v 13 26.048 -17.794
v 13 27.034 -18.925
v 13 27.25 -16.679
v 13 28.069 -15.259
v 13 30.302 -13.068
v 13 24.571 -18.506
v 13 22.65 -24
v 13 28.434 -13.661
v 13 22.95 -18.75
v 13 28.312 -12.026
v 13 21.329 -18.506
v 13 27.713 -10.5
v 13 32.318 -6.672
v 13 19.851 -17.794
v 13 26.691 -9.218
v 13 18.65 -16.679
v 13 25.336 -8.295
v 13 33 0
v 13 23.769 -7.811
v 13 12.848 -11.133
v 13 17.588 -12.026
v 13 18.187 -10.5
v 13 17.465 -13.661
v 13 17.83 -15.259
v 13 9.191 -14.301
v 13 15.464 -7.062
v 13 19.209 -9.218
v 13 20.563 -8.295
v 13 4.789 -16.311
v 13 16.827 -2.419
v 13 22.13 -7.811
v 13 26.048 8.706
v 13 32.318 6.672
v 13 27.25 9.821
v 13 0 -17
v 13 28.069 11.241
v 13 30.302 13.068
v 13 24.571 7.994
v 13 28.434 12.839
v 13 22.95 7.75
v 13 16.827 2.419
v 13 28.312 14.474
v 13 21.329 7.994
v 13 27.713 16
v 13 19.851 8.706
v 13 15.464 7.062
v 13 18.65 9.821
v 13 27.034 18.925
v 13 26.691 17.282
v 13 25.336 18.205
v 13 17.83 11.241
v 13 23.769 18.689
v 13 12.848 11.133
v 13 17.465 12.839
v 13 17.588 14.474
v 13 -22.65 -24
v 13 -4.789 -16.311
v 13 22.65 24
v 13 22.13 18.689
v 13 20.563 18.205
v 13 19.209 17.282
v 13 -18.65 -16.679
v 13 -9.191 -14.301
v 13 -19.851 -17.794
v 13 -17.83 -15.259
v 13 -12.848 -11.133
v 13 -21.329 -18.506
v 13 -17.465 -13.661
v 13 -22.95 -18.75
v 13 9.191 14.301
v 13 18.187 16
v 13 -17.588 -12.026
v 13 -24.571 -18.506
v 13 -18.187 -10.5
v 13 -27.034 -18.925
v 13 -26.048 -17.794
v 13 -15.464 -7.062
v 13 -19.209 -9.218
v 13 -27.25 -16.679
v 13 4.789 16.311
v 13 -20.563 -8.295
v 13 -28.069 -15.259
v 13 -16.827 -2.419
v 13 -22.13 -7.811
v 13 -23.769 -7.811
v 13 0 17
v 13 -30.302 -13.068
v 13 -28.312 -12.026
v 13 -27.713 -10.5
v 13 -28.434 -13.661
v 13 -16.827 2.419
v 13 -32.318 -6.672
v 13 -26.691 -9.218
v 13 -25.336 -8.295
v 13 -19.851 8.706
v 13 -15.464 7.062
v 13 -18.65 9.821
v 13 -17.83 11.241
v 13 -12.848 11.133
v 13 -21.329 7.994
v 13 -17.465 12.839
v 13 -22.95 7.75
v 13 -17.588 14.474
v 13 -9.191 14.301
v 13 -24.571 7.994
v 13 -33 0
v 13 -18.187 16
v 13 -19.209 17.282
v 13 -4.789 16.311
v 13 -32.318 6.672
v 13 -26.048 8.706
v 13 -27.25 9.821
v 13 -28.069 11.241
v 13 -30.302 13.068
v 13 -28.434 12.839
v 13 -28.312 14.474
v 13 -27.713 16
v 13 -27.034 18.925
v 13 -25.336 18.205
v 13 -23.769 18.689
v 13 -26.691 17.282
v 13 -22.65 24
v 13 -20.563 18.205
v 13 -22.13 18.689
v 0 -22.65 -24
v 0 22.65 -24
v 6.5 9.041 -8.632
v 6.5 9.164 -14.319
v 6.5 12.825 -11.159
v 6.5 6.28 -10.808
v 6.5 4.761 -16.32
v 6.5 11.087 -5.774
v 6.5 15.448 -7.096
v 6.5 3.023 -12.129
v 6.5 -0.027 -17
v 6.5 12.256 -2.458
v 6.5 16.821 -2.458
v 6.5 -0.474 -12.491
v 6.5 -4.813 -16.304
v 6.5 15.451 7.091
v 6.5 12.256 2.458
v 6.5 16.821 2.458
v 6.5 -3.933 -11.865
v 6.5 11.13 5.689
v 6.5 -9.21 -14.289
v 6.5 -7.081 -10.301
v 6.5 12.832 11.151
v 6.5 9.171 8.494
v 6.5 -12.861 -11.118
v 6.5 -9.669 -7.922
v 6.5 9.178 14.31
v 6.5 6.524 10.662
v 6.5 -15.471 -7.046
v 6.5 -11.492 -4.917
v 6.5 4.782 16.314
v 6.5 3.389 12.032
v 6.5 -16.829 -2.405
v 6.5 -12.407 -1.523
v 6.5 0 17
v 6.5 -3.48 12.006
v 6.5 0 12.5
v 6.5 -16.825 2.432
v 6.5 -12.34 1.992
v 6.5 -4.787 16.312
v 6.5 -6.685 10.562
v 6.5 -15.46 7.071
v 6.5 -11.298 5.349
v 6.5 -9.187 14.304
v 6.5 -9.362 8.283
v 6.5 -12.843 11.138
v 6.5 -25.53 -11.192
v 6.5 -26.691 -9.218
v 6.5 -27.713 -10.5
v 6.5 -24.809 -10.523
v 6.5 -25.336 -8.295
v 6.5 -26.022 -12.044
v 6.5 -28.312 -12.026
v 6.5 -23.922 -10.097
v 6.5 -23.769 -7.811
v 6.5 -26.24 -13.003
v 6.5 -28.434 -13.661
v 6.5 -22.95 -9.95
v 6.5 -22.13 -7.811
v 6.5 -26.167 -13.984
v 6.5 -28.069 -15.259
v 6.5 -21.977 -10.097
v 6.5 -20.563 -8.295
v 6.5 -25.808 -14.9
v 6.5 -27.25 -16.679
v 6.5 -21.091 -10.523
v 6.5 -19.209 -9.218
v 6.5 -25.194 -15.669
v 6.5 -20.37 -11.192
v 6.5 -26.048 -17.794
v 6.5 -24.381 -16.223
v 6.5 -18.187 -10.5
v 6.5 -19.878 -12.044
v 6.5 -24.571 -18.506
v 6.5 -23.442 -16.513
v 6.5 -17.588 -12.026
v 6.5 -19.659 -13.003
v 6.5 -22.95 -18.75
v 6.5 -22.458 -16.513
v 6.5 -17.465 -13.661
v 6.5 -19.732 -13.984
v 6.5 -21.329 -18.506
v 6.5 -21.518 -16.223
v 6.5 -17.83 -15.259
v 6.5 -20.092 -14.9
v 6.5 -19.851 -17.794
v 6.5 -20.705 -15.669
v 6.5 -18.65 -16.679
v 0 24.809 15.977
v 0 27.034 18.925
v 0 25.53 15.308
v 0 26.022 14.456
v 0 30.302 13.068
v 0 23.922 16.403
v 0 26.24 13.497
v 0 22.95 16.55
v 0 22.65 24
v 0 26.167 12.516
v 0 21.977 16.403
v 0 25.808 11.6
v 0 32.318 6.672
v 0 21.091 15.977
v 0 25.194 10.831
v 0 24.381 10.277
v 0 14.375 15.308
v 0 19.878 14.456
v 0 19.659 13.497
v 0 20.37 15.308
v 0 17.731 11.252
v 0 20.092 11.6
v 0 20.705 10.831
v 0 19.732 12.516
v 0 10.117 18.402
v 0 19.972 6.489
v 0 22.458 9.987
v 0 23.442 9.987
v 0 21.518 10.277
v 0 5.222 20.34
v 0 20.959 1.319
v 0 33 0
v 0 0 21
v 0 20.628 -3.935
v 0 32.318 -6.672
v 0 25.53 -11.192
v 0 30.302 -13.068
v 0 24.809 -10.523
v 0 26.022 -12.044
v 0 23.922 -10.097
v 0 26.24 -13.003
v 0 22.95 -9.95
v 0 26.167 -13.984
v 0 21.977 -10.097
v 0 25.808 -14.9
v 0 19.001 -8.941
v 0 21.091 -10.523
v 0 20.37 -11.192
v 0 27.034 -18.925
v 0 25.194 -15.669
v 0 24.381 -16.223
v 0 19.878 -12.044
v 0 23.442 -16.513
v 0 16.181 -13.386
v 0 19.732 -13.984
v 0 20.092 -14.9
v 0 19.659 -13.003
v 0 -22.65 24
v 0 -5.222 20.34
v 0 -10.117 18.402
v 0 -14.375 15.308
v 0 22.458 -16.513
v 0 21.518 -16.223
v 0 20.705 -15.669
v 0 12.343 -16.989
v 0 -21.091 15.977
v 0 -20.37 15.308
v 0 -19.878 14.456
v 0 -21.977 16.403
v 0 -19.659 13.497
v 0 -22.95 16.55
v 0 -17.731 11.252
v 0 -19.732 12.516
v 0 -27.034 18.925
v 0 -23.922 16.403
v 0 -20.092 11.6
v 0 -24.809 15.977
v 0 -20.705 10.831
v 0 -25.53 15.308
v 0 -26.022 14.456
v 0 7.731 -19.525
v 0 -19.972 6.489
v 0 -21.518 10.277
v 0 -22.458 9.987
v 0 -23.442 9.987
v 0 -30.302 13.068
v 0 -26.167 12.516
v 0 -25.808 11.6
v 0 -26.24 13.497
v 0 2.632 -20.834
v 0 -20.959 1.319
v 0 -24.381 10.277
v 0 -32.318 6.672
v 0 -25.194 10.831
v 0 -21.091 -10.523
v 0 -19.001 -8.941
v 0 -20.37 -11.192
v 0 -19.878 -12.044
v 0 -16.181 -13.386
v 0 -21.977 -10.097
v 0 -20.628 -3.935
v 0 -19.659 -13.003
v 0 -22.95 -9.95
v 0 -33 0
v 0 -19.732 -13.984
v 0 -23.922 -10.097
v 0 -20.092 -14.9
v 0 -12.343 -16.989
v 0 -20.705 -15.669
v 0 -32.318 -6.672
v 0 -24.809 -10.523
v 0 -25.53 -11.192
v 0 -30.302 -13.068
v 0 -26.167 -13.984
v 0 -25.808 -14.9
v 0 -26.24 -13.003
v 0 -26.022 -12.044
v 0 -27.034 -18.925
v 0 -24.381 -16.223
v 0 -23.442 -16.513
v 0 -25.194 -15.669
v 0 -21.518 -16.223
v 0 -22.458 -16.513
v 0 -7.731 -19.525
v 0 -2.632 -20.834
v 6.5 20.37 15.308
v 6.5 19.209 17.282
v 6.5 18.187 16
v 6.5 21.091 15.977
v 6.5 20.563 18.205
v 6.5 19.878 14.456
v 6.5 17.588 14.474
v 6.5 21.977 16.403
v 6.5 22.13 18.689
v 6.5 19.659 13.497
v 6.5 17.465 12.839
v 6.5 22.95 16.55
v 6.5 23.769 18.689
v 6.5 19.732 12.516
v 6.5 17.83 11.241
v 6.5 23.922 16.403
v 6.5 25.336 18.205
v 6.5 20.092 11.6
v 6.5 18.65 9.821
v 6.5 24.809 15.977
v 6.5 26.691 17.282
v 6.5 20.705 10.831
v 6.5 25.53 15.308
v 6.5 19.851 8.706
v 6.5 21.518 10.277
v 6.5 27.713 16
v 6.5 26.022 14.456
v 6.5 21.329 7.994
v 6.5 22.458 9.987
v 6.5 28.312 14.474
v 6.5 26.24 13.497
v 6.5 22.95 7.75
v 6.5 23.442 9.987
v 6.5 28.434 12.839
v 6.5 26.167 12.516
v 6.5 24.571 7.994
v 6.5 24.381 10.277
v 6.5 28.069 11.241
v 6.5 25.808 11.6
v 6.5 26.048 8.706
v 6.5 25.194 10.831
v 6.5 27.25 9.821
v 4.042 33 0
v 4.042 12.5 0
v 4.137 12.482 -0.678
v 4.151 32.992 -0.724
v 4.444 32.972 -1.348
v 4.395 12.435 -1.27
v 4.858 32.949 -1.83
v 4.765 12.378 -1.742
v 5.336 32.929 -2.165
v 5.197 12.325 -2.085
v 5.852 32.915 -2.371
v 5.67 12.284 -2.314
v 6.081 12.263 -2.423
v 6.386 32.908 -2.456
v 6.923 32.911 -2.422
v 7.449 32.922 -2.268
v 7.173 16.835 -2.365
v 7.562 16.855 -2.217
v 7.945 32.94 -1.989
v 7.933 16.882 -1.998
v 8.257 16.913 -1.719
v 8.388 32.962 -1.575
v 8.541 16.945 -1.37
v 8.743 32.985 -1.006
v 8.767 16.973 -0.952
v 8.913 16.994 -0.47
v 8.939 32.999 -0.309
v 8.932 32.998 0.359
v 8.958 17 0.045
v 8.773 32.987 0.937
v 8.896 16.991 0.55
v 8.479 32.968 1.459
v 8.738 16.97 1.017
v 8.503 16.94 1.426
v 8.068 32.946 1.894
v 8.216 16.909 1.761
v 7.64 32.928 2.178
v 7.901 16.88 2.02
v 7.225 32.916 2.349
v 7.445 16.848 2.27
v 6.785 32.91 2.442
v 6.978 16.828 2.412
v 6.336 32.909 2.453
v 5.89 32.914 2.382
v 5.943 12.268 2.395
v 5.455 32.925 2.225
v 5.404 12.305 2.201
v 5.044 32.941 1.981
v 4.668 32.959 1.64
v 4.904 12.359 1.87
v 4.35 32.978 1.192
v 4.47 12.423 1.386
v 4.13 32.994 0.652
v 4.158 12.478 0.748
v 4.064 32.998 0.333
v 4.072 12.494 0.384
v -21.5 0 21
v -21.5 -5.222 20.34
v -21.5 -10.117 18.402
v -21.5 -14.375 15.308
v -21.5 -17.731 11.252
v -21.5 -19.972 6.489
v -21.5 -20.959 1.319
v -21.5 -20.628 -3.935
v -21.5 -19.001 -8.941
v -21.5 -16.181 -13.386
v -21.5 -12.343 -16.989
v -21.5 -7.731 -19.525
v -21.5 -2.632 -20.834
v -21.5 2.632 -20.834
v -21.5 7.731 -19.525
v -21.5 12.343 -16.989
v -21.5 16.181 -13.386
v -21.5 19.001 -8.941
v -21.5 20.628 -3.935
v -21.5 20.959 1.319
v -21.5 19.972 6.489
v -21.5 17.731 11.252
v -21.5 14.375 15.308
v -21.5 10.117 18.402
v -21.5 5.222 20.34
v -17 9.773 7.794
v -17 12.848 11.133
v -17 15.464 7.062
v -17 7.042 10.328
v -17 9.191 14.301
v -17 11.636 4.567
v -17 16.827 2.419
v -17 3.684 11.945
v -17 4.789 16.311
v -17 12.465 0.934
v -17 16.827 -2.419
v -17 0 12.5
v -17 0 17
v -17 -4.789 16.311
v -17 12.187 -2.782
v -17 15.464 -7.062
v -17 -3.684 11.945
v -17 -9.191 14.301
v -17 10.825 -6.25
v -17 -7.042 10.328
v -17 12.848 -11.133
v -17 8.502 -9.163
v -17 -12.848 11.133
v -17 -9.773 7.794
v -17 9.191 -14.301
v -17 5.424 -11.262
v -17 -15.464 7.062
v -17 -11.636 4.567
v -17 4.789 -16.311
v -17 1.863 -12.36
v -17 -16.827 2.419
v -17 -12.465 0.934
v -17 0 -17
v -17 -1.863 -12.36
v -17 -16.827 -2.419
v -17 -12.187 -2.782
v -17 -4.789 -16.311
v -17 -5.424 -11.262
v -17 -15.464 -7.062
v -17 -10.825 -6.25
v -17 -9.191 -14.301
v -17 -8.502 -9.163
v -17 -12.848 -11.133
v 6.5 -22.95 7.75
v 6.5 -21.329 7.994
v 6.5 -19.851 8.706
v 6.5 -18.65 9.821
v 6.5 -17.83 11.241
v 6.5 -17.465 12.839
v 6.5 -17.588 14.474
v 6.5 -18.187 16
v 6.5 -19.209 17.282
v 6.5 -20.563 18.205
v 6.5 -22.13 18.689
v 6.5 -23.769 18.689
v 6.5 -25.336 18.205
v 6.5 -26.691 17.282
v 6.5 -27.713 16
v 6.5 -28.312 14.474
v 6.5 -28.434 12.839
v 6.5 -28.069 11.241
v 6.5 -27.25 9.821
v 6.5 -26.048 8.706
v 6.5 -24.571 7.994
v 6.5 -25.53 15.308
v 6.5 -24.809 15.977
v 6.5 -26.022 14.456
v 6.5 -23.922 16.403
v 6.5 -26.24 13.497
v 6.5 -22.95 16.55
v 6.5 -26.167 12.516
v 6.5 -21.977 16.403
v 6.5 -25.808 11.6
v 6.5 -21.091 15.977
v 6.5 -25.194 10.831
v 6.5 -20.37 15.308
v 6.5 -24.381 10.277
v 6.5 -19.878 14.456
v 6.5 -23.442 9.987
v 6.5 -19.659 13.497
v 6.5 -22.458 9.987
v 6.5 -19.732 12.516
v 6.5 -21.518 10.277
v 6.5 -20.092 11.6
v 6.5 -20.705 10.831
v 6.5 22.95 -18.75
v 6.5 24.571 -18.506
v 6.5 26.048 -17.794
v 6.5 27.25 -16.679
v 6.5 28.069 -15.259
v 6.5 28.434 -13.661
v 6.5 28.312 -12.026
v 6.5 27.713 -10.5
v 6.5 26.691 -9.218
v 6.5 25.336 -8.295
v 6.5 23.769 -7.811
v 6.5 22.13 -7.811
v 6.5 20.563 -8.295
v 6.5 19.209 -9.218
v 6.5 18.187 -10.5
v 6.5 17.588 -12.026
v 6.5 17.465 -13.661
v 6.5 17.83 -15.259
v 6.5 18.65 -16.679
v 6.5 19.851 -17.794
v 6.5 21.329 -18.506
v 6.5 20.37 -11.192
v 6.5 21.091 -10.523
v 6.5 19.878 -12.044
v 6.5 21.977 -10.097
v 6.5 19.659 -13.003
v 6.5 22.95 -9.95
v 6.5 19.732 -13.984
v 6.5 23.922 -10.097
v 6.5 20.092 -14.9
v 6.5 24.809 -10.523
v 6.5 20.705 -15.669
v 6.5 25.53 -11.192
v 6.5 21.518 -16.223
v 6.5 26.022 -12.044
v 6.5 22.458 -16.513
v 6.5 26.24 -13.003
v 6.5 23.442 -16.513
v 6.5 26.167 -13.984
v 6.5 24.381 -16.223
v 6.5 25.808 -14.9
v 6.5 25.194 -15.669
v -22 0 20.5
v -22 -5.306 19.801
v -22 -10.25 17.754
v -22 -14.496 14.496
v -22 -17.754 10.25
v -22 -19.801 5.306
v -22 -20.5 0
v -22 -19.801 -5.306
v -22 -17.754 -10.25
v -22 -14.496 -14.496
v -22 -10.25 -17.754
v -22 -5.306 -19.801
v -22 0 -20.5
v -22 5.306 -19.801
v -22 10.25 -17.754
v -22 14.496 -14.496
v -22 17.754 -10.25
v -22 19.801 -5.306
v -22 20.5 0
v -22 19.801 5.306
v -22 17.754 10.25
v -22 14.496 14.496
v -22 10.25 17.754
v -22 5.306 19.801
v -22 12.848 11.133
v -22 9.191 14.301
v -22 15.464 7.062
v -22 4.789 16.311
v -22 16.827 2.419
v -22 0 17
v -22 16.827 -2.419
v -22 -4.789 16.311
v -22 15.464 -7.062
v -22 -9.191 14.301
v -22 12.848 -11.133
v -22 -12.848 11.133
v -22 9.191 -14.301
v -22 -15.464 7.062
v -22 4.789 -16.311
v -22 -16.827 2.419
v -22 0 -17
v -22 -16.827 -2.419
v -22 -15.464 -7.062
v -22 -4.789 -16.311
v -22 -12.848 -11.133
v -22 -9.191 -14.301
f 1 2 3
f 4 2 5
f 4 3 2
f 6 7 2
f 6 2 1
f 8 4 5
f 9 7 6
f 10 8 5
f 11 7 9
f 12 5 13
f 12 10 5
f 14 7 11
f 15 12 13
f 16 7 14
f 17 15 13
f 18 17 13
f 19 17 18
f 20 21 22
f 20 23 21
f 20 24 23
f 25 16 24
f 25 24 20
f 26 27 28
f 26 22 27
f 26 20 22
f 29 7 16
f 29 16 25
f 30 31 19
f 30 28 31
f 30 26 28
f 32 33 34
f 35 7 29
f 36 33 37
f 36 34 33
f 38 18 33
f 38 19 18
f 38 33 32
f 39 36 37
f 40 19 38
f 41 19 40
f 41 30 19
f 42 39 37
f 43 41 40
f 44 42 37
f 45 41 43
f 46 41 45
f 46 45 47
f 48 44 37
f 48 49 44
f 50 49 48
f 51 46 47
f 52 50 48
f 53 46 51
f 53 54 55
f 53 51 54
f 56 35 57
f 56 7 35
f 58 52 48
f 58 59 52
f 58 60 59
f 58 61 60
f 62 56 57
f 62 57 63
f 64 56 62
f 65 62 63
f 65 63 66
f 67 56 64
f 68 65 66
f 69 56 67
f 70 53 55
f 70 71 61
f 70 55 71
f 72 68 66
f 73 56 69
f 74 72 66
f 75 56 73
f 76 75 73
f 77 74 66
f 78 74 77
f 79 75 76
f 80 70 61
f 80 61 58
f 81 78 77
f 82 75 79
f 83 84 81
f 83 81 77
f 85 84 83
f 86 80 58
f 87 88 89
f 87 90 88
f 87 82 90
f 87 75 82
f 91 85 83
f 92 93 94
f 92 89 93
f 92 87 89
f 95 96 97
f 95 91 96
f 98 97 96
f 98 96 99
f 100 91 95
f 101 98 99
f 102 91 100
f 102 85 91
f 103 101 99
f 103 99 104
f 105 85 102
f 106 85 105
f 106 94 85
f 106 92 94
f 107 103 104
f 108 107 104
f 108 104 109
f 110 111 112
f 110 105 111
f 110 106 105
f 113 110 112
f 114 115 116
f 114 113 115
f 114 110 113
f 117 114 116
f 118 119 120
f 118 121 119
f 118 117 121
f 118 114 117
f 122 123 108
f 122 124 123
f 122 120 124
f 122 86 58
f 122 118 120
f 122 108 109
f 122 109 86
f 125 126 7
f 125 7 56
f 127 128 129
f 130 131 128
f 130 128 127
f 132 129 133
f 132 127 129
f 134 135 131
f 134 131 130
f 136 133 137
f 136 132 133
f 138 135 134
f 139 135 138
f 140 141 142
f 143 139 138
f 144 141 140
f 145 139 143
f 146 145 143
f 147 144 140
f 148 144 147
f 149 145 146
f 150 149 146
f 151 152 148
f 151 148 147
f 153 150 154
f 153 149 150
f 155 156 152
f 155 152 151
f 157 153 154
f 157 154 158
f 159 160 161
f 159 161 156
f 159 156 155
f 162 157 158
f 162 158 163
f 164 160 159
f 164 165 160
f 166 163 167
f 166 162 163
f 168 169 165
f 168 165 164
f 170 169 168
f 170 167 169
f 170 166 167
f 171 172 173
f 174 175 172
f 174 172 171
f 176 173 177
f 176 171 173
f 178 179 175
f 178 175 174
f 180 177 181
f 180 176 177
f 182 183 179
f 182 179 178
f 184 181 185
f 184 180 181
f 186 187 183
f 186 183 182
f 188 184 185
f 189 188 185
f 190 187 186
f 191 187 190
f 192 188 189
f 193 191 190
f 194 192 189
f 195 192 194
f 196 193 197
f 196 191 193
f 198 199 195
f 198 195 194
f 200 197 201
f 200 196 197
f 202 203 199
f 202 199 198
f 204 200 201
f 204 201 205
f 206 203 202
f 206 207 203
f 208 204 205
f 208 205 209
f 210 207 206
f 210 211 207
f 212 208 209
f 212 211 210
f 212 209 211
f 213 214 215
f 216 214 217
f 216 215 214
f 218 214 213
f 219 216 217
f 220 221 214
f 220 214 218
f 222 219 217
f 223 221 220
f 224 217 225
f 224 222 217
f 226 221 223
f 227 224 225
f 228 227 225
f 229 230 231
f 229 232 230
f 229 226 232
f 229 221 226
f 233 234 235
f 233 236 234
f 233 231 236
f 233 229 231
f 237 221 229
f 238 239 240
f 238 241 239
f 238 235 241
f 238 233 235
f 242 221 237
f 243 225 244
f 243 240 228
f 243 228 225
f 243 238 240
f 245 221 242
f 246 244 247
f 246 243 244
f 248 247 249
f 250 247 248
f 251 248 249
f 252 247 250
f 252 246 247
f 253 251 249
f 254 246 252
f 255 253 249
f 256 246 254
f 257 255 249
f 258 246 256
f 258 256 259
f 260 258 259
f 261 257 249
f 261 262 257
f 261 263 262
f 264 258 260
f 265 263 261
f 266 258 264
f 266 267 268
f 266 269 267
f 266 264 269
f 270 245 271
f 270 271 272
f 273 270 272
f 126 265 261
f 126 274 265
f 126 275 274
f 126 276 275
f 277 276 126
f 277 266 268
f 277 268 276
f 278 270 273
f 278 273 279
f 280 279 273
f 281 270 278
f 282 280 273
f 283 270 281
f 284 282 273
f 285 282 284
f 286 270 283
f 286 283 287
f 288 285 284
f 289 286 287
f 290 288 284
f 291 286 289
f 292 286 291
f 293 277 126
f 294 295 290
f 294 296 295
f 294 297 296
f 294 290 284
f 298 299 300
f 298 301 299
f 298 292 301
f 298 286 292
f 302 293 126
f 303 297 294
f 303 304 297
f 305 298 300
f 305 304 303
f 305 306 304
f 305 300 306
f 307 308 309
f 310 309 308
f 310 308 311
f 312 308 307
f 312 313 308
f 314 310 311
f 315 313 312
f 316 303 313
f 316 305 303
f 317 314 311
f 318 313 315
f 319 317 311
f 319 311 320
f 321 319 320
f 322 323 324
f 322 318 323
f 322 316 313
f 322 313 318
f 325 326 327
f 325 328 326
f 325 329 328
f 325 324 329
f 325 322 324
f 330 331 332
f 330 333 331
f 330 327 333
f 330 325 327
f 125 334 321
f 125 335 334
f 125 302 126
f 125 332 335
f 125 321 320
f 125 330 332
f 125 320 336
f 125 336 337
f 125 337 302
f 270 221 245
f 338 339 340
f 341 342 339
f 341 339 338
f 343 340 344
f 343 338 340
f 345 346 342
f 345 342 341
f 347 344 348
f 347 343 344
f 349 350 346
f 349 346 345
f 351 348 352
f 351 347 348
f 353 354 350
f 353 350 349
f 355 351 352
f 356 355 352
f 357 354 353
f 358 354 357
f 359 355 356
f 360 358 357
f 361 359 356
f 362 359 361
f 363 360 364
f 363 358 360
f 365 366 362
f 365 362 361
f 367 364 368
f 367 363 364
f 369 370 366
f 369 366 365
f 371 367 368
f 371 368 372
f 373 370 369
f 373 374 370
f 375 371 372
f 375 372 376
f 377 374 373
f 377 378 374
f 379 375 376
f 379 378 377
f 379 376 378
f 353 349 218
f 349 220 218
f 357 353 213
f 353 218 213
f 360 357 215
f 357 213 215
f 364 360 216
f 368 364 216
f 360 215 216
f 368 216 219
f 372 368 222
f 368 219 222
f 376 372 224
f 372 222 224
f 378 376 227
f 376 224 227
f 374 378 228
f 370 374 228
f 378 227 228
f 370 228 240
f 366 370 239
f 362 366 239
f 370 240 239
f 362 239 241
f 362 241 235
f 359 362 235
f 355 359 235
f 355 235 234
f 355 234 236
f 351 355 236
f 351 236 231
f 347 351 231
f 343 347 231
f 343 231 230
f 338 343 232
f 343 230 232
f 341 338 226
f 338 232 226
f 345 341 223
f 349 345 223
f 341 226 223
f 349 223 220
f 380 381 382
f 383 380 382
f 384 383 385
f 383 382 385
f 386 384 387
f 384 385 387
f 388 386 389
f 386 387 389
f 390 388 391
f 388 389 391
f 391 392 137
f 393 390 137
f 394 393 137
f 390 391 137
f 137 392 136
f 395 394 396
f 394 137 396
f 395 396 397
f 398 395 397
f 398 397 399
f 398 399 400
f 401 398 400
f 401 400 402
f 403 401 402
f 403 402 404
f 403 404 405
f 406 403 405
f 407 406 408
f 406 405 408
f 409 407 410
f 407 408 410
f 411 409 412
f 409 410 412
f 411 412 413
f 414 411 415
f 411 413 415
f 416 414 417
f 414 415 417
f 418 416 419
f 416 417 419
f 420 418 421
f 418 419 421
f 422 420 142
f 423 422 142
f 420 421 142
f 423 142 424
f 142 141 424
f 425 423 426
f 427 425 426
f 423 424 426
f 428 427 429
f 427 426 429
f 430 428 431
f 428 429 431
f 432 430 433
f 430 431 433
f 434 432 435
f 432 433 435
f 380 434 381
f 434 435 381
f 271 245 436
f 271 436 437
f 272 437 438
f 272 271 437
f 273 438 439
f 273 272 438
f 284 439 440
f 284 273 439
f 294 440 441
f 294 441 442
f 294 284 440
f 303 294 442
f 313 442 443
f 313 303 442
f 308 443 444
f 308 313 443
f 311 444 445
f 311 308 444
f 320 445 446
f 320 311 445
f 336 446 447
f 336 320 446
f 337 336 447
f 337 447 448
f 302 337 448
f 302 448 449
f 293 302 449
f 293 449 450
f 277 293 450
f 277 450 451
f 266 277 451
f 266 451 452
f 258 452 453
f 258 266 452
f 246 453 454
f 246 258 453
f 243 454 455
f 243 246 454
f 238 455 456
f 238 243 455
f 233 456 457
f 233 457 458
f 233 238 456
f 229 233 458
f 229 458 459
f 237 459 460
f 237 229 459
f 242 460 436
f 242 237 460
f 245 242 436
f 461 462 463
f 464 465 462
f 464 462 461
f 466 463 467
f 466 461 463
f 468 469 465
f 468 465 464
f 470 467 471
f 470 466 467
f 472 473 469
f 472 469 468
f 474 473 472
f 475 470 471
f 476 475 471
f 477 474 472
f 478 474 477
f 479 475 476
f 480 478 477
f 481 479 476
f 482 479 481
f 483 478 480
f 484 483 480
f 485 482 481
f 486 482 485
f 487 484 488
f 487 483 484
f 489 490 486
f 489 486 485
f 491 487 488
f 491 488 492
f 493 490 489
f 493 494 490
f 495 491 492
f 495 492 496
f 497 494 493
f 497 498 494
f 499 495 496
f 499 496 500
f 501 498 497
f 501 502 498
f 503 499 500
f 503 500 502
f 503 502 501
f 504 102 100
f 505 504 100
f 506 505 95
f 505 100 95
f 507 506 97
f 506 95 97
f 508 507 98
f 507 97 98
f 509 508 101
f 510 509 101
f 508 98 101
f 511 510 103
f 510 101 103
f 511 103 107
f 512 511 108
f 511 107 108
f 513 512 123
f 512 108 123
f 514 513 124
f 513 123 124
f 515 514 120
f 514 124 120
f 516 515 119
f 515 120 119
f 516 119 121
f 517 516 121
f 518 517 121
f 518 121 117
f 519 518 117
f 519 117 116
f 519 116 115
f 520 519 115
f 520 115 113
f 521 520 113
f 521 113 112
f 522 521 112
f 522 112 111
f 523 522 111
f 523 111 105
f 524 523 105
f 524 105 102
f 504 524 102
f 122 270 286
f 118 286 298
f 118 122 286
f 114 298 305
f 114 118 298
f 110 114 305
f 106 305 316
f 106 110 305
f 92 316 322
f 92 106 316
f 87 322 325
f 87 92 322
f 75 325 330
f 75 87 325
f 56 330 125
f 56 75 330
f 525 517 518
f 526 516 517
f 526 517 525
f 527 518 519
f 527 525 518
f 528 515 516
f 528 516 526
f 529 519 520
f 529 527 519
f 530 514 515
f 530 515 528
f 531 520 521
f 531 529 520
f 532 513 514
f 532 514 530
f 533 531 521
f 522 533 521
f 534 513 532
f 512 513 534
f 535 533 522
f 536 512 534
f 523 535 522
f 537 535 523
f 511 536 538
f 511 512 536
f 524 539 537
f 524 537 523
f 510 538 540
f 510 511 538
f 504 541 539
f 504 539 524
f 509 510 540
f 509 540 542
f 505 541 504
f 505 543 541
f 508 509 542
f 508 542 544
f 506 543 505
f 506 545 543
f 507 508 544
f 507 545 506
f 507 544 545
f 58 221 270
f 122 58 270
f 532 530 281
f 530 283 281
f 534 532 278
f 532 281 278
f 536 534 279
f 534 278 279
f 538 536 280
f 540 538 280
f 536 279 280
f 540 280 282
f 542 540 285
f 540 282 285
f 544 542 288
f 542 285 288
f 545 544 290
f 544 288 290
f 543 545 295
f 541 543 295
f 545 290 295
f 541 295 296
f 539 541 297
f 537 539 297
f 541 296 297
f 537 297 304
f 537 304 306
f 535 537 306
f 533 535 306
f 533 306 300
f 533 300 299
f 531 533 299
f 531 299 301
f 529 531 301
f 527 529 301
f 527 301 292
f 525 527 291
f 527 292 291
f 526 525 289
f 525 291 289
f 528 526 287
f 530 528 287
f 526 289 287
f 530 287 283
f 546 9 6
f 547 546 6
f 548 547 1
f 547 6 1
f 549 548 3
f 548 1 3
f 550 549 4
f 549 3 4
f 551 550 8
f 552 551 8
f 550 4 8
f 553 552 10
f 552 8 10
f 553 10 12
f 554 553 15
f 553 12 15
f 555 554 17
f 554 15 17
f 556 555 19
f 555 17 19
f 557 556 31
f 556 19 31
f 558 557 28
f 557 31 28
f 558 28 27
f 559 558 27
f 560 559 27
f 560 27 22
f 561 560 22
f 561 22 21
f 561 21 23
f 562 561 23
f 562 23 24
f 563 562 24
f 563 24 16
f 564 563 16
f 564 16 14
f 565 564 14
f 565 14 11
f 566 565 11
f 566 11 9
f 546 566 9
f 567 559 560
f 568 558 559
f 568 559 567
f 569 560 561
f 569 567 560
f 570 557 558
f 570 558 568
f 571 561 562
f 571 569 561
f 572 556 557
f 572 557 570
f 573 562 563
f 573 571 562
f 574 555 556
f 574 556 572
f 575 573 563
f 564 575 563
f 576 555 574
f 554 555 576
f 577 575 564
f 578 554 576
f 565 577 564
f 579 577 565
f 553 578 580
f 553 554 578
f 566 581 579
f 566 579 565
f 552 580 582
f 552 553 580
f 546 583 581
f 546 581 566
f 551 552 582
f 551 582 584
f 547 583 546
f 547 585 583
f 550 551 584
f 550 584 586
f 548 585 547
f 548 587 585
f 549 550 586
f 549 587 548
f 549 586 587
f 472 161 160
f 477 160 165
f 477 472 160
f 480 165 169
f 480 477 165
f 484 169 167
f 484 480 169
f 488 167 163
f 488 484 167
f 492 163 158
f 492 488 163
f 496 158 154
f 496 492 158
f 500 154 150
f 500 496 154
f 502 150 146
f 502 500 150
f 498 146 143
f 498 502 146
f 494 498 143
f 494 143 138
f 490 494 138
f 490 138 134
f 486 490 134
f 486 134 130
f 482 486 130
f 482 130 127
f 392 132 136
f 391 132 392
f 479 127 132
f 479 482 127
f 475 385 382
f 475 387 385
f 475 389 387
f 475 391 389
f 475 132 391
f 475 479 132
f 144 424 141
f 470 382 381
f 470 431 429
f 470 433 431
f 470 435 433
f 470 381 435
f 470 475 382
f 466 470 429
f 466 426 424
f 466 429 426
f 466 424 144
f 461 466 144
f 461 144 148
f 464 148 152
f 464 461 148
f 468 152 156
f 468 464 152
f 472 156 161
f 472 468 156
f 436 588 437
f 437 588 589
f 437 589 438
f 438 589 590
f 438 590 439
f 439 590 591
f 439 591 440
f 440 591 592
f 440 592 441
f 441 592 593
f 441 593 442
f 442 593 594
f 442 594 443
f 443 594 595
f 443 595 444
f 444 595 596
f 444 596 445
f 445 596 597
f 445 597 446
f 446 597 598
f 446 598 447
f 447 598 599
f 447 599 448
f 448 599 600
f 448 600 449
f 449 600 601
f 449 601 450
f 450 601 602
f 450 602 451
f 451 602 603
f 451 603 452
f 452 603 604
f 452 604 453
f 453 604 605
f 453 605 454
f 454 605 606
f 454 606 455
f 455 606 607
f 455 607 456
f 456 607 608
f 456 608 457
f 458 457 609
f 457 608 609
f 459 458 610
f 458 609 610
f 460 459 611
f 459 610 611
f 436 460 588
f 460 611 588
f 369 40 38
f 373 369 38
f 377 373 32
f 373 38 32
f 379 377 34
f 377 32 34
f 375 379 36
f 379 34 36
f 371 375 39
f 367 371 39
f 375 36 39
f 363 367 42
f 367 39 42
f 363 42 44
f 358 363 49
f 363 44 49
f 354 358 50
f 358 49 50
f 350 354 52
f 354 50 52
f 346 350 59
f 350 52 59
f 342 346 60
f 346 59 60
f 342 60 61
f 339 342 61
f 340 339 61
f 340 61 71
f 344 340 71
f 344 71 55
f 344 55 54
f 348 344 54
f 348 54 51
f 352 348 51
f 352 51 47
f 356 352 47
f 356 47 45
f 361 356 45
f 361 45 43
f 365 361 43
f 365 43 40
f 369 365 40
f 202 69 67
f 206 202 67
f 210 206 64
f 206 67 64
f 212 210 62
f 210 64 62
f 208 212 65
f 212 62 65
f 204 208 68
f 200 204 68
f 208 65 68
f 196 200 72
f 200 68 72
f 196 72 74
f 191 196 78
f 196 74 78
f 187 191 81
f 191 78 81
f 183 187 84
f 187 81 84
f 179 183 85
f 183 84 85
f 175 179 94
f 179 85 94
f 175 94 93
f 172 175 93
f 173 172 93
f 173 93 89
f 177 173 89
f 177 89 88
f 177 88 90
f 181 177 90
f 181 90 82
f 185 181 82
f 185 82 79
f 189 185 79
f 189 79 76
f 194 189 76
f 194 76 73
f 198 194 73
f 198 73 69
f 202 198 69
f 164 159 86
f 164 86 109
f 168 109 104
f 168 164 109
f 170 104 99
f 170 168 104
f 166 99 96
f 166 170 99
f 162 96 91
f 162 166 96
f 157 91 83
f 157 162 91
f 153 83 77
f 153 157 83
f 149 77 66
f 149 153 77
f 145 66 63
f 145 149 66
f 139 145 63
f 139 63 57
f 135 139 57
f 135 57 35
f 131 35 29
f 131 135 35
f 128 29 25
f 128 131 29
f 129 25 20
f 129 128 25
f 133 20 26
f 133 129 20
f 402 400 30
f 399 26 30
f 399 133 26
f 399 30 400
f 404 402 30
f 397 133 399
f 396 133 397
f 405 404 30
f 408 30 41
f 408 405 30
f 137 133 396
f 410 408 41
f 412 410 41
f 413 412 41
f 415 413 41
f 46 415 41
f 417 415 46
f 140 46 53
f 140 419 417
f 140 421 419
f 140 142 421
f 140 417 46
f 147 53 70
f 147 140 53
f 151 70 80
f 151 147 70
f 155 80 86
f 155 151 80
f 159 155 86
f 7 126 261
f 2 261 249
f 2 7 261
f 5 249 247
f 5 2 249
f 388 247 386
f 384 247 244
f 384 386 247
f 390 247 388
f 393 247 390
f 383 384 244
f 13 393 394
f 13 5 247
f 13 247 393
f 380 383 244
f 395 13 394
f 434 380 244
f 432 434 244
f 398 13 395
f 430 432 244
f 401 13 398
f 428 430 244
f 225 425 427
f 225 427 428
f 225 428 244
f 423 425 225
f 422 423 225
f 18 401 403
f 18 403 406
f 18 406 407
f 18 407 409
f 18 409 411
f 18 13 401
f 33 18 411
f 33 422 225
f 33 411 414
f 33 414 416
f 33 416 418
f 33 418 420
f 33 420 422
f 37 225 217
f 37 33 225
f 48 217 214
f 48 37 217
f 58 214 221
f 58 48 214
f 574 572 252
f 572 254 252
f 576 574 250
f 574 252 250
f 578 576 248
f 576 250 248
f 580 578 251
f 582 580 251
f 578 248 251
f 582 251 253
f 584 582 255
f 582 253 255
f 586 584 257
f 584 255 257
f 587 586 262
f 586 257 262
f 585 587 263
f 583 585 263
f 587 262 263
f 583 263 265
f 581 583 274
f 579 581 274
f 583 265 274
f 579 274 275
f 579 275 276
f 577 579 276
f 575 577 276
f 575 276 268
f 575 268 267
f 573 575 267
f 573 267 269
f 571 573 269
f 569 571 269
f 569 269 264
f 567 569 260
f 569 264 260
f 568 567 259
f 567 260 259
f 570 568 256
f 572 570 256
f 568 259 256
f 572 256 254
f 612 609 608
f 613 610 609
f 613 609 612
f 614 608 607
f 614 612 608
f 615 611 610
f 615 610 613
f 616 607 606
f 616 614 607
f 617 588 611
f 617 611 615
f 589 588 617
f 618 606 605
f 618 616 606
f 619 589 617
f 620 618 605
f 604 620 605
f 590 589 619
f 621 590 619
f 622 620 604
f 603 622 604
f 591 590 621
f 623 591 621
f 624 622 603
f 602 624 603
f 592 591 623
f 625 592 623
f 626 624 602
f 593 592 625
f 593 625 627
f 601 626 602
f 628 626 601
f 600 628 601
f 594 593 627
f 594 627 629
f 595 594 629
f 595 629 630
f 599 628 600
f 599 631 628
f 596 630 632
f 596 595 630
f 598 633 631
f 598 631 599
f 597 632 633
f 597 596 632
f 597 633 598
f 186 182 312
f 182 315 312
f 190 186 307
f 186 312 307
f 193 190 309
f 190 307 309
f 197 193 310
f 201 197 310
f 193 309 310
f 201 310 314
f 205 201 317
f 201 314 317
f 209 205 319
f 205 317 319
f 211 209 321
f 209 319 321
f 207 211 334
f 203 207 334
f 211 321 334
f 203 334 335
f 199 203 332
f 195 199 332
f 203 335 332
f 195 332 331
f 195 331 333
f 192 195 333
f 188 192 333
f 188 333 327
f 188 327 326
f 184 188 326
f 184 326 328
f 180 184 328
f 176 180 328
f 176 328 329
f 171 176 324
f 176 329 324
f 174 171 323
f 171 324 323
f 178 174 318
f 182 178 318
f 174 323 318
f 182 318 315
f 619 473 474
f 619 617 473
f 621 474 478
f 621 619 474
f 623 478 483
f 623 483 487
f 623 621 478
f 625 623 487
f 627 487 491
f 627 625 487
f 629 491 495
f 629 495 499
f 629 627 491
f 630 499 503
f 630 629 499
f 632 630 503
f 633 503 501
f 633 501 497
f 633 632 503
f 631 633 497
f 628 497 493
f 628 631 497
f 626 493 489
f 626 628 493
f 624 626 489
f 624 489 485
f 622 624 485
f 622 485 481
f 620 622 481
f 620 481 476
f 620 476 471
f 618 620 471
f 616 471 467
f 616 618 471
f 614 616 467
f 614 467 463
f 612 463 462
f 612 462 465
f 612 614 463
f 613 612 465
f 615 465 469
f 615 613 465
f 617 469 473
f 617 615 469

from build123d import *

# Parameters (mm, degrees)
CUT_EXTRUDE1_DEPTH                 = 52.594573358
SOCKET_HEAD_CAP_SCREW1_D           = 6.6
SOCKET_HEAD_CAP_SCREW1_CBORE_D     = 11
SOCKET_HEAD_CAP_SCREW1_CBORE_DEPTH = 6.5
TAP1_D                             = 4.917
TAP1_DEPTH                         = 32.999
TAP1_TIP                           = 1.477215832
CHAMFER1_SIZE                      = 0.5


with BuildPart() as part:
    # Sketch1 → Revolve1 (revolve)
    with BuildSketch(Plane.XY, mode=Mode.PRIVATE) as revolve1_sk:
        Polygon((6.5, 17), (6.5, 12.5), (-17, 12.5), (-17, 17), (-22, 17), (-22, 21), (0, 21), (0, 33), (13, 33), (13, 17), align=None)
    revolve(revolve1_sk.sketch.rotate(Axis((-22, 0, 0), (1, 0, 0)), 90), axis=Axis((-22, 0, 0), (1, 0, 0)))

    # Sketch2 → Cut-Extrude1 (cut, through all)
    with BuildSketch(Plane(origin=(0, 0, 0), x_dir=(0, 0, -1), z_dir=(1, 0, 0))):
        with BuildLine():
            Line((24, 22.649503306), (24, -22.649503306))
            ThreePointArc((24, -22.649503306), (33, 0), (24, 22.649503306))
        make_face()
        with BuildLine():
            Line((-24, 22.649503306), (-24, -22.649503306))
            ThreePointArc((-24, -22.649503306), (-33, 0), (-24, 22.649503306))
        make_face()
    extrude(amount=CUT_EXTRUDE1_DEPTH, mode=Mode.SUBTRACT)

    # Socket Head Cap Screw1 (through all)
    with Locations(Plane(origin=(13, 0, 0), x_dir=(0, 0, -1), z_dir=(1, 0, 0))):
        with Locations((-13.25, 22.9496732), (13.25, -22.9496732), (-13.25, -22.9496732), (13.25, 22.9496732)):
            CounterBoreHole(SOCKET_HEAD_CAP_SCREW1_D / 2, SOCKET_HEAD_CAP_SCREW1_CBORE_D / 2, SOCKET_HEAD_CAP_SCREW1_CBORE_DEPTH)

    # Tap1
    with Locations(Plane(origin=(0, 33, 0), x_dir=(1, 0, 0), z_dir=(0, 1, 0))):
        with Locations((6.5, 0)):
            Hole(TAP1_D / 2, depth=TAP1_DEPTH)
            with Locations((0, 0, -(TAP1_DEPTH + TAP1_TIP / 2))):  # 118° drill point
                Cone(0, TAP1_D / 2, TAP1_TIP, mode=Mode.SUBTRACT)

    # Chamfer1
    chamfer1_edges = [part.edges().sort_by_distance(p)[0] for p in [
        (-22, 0, -21),
    ]]
    chamfer(chamfer1_edges, length=CHAMFER1_SIZE)


solid = part.part
